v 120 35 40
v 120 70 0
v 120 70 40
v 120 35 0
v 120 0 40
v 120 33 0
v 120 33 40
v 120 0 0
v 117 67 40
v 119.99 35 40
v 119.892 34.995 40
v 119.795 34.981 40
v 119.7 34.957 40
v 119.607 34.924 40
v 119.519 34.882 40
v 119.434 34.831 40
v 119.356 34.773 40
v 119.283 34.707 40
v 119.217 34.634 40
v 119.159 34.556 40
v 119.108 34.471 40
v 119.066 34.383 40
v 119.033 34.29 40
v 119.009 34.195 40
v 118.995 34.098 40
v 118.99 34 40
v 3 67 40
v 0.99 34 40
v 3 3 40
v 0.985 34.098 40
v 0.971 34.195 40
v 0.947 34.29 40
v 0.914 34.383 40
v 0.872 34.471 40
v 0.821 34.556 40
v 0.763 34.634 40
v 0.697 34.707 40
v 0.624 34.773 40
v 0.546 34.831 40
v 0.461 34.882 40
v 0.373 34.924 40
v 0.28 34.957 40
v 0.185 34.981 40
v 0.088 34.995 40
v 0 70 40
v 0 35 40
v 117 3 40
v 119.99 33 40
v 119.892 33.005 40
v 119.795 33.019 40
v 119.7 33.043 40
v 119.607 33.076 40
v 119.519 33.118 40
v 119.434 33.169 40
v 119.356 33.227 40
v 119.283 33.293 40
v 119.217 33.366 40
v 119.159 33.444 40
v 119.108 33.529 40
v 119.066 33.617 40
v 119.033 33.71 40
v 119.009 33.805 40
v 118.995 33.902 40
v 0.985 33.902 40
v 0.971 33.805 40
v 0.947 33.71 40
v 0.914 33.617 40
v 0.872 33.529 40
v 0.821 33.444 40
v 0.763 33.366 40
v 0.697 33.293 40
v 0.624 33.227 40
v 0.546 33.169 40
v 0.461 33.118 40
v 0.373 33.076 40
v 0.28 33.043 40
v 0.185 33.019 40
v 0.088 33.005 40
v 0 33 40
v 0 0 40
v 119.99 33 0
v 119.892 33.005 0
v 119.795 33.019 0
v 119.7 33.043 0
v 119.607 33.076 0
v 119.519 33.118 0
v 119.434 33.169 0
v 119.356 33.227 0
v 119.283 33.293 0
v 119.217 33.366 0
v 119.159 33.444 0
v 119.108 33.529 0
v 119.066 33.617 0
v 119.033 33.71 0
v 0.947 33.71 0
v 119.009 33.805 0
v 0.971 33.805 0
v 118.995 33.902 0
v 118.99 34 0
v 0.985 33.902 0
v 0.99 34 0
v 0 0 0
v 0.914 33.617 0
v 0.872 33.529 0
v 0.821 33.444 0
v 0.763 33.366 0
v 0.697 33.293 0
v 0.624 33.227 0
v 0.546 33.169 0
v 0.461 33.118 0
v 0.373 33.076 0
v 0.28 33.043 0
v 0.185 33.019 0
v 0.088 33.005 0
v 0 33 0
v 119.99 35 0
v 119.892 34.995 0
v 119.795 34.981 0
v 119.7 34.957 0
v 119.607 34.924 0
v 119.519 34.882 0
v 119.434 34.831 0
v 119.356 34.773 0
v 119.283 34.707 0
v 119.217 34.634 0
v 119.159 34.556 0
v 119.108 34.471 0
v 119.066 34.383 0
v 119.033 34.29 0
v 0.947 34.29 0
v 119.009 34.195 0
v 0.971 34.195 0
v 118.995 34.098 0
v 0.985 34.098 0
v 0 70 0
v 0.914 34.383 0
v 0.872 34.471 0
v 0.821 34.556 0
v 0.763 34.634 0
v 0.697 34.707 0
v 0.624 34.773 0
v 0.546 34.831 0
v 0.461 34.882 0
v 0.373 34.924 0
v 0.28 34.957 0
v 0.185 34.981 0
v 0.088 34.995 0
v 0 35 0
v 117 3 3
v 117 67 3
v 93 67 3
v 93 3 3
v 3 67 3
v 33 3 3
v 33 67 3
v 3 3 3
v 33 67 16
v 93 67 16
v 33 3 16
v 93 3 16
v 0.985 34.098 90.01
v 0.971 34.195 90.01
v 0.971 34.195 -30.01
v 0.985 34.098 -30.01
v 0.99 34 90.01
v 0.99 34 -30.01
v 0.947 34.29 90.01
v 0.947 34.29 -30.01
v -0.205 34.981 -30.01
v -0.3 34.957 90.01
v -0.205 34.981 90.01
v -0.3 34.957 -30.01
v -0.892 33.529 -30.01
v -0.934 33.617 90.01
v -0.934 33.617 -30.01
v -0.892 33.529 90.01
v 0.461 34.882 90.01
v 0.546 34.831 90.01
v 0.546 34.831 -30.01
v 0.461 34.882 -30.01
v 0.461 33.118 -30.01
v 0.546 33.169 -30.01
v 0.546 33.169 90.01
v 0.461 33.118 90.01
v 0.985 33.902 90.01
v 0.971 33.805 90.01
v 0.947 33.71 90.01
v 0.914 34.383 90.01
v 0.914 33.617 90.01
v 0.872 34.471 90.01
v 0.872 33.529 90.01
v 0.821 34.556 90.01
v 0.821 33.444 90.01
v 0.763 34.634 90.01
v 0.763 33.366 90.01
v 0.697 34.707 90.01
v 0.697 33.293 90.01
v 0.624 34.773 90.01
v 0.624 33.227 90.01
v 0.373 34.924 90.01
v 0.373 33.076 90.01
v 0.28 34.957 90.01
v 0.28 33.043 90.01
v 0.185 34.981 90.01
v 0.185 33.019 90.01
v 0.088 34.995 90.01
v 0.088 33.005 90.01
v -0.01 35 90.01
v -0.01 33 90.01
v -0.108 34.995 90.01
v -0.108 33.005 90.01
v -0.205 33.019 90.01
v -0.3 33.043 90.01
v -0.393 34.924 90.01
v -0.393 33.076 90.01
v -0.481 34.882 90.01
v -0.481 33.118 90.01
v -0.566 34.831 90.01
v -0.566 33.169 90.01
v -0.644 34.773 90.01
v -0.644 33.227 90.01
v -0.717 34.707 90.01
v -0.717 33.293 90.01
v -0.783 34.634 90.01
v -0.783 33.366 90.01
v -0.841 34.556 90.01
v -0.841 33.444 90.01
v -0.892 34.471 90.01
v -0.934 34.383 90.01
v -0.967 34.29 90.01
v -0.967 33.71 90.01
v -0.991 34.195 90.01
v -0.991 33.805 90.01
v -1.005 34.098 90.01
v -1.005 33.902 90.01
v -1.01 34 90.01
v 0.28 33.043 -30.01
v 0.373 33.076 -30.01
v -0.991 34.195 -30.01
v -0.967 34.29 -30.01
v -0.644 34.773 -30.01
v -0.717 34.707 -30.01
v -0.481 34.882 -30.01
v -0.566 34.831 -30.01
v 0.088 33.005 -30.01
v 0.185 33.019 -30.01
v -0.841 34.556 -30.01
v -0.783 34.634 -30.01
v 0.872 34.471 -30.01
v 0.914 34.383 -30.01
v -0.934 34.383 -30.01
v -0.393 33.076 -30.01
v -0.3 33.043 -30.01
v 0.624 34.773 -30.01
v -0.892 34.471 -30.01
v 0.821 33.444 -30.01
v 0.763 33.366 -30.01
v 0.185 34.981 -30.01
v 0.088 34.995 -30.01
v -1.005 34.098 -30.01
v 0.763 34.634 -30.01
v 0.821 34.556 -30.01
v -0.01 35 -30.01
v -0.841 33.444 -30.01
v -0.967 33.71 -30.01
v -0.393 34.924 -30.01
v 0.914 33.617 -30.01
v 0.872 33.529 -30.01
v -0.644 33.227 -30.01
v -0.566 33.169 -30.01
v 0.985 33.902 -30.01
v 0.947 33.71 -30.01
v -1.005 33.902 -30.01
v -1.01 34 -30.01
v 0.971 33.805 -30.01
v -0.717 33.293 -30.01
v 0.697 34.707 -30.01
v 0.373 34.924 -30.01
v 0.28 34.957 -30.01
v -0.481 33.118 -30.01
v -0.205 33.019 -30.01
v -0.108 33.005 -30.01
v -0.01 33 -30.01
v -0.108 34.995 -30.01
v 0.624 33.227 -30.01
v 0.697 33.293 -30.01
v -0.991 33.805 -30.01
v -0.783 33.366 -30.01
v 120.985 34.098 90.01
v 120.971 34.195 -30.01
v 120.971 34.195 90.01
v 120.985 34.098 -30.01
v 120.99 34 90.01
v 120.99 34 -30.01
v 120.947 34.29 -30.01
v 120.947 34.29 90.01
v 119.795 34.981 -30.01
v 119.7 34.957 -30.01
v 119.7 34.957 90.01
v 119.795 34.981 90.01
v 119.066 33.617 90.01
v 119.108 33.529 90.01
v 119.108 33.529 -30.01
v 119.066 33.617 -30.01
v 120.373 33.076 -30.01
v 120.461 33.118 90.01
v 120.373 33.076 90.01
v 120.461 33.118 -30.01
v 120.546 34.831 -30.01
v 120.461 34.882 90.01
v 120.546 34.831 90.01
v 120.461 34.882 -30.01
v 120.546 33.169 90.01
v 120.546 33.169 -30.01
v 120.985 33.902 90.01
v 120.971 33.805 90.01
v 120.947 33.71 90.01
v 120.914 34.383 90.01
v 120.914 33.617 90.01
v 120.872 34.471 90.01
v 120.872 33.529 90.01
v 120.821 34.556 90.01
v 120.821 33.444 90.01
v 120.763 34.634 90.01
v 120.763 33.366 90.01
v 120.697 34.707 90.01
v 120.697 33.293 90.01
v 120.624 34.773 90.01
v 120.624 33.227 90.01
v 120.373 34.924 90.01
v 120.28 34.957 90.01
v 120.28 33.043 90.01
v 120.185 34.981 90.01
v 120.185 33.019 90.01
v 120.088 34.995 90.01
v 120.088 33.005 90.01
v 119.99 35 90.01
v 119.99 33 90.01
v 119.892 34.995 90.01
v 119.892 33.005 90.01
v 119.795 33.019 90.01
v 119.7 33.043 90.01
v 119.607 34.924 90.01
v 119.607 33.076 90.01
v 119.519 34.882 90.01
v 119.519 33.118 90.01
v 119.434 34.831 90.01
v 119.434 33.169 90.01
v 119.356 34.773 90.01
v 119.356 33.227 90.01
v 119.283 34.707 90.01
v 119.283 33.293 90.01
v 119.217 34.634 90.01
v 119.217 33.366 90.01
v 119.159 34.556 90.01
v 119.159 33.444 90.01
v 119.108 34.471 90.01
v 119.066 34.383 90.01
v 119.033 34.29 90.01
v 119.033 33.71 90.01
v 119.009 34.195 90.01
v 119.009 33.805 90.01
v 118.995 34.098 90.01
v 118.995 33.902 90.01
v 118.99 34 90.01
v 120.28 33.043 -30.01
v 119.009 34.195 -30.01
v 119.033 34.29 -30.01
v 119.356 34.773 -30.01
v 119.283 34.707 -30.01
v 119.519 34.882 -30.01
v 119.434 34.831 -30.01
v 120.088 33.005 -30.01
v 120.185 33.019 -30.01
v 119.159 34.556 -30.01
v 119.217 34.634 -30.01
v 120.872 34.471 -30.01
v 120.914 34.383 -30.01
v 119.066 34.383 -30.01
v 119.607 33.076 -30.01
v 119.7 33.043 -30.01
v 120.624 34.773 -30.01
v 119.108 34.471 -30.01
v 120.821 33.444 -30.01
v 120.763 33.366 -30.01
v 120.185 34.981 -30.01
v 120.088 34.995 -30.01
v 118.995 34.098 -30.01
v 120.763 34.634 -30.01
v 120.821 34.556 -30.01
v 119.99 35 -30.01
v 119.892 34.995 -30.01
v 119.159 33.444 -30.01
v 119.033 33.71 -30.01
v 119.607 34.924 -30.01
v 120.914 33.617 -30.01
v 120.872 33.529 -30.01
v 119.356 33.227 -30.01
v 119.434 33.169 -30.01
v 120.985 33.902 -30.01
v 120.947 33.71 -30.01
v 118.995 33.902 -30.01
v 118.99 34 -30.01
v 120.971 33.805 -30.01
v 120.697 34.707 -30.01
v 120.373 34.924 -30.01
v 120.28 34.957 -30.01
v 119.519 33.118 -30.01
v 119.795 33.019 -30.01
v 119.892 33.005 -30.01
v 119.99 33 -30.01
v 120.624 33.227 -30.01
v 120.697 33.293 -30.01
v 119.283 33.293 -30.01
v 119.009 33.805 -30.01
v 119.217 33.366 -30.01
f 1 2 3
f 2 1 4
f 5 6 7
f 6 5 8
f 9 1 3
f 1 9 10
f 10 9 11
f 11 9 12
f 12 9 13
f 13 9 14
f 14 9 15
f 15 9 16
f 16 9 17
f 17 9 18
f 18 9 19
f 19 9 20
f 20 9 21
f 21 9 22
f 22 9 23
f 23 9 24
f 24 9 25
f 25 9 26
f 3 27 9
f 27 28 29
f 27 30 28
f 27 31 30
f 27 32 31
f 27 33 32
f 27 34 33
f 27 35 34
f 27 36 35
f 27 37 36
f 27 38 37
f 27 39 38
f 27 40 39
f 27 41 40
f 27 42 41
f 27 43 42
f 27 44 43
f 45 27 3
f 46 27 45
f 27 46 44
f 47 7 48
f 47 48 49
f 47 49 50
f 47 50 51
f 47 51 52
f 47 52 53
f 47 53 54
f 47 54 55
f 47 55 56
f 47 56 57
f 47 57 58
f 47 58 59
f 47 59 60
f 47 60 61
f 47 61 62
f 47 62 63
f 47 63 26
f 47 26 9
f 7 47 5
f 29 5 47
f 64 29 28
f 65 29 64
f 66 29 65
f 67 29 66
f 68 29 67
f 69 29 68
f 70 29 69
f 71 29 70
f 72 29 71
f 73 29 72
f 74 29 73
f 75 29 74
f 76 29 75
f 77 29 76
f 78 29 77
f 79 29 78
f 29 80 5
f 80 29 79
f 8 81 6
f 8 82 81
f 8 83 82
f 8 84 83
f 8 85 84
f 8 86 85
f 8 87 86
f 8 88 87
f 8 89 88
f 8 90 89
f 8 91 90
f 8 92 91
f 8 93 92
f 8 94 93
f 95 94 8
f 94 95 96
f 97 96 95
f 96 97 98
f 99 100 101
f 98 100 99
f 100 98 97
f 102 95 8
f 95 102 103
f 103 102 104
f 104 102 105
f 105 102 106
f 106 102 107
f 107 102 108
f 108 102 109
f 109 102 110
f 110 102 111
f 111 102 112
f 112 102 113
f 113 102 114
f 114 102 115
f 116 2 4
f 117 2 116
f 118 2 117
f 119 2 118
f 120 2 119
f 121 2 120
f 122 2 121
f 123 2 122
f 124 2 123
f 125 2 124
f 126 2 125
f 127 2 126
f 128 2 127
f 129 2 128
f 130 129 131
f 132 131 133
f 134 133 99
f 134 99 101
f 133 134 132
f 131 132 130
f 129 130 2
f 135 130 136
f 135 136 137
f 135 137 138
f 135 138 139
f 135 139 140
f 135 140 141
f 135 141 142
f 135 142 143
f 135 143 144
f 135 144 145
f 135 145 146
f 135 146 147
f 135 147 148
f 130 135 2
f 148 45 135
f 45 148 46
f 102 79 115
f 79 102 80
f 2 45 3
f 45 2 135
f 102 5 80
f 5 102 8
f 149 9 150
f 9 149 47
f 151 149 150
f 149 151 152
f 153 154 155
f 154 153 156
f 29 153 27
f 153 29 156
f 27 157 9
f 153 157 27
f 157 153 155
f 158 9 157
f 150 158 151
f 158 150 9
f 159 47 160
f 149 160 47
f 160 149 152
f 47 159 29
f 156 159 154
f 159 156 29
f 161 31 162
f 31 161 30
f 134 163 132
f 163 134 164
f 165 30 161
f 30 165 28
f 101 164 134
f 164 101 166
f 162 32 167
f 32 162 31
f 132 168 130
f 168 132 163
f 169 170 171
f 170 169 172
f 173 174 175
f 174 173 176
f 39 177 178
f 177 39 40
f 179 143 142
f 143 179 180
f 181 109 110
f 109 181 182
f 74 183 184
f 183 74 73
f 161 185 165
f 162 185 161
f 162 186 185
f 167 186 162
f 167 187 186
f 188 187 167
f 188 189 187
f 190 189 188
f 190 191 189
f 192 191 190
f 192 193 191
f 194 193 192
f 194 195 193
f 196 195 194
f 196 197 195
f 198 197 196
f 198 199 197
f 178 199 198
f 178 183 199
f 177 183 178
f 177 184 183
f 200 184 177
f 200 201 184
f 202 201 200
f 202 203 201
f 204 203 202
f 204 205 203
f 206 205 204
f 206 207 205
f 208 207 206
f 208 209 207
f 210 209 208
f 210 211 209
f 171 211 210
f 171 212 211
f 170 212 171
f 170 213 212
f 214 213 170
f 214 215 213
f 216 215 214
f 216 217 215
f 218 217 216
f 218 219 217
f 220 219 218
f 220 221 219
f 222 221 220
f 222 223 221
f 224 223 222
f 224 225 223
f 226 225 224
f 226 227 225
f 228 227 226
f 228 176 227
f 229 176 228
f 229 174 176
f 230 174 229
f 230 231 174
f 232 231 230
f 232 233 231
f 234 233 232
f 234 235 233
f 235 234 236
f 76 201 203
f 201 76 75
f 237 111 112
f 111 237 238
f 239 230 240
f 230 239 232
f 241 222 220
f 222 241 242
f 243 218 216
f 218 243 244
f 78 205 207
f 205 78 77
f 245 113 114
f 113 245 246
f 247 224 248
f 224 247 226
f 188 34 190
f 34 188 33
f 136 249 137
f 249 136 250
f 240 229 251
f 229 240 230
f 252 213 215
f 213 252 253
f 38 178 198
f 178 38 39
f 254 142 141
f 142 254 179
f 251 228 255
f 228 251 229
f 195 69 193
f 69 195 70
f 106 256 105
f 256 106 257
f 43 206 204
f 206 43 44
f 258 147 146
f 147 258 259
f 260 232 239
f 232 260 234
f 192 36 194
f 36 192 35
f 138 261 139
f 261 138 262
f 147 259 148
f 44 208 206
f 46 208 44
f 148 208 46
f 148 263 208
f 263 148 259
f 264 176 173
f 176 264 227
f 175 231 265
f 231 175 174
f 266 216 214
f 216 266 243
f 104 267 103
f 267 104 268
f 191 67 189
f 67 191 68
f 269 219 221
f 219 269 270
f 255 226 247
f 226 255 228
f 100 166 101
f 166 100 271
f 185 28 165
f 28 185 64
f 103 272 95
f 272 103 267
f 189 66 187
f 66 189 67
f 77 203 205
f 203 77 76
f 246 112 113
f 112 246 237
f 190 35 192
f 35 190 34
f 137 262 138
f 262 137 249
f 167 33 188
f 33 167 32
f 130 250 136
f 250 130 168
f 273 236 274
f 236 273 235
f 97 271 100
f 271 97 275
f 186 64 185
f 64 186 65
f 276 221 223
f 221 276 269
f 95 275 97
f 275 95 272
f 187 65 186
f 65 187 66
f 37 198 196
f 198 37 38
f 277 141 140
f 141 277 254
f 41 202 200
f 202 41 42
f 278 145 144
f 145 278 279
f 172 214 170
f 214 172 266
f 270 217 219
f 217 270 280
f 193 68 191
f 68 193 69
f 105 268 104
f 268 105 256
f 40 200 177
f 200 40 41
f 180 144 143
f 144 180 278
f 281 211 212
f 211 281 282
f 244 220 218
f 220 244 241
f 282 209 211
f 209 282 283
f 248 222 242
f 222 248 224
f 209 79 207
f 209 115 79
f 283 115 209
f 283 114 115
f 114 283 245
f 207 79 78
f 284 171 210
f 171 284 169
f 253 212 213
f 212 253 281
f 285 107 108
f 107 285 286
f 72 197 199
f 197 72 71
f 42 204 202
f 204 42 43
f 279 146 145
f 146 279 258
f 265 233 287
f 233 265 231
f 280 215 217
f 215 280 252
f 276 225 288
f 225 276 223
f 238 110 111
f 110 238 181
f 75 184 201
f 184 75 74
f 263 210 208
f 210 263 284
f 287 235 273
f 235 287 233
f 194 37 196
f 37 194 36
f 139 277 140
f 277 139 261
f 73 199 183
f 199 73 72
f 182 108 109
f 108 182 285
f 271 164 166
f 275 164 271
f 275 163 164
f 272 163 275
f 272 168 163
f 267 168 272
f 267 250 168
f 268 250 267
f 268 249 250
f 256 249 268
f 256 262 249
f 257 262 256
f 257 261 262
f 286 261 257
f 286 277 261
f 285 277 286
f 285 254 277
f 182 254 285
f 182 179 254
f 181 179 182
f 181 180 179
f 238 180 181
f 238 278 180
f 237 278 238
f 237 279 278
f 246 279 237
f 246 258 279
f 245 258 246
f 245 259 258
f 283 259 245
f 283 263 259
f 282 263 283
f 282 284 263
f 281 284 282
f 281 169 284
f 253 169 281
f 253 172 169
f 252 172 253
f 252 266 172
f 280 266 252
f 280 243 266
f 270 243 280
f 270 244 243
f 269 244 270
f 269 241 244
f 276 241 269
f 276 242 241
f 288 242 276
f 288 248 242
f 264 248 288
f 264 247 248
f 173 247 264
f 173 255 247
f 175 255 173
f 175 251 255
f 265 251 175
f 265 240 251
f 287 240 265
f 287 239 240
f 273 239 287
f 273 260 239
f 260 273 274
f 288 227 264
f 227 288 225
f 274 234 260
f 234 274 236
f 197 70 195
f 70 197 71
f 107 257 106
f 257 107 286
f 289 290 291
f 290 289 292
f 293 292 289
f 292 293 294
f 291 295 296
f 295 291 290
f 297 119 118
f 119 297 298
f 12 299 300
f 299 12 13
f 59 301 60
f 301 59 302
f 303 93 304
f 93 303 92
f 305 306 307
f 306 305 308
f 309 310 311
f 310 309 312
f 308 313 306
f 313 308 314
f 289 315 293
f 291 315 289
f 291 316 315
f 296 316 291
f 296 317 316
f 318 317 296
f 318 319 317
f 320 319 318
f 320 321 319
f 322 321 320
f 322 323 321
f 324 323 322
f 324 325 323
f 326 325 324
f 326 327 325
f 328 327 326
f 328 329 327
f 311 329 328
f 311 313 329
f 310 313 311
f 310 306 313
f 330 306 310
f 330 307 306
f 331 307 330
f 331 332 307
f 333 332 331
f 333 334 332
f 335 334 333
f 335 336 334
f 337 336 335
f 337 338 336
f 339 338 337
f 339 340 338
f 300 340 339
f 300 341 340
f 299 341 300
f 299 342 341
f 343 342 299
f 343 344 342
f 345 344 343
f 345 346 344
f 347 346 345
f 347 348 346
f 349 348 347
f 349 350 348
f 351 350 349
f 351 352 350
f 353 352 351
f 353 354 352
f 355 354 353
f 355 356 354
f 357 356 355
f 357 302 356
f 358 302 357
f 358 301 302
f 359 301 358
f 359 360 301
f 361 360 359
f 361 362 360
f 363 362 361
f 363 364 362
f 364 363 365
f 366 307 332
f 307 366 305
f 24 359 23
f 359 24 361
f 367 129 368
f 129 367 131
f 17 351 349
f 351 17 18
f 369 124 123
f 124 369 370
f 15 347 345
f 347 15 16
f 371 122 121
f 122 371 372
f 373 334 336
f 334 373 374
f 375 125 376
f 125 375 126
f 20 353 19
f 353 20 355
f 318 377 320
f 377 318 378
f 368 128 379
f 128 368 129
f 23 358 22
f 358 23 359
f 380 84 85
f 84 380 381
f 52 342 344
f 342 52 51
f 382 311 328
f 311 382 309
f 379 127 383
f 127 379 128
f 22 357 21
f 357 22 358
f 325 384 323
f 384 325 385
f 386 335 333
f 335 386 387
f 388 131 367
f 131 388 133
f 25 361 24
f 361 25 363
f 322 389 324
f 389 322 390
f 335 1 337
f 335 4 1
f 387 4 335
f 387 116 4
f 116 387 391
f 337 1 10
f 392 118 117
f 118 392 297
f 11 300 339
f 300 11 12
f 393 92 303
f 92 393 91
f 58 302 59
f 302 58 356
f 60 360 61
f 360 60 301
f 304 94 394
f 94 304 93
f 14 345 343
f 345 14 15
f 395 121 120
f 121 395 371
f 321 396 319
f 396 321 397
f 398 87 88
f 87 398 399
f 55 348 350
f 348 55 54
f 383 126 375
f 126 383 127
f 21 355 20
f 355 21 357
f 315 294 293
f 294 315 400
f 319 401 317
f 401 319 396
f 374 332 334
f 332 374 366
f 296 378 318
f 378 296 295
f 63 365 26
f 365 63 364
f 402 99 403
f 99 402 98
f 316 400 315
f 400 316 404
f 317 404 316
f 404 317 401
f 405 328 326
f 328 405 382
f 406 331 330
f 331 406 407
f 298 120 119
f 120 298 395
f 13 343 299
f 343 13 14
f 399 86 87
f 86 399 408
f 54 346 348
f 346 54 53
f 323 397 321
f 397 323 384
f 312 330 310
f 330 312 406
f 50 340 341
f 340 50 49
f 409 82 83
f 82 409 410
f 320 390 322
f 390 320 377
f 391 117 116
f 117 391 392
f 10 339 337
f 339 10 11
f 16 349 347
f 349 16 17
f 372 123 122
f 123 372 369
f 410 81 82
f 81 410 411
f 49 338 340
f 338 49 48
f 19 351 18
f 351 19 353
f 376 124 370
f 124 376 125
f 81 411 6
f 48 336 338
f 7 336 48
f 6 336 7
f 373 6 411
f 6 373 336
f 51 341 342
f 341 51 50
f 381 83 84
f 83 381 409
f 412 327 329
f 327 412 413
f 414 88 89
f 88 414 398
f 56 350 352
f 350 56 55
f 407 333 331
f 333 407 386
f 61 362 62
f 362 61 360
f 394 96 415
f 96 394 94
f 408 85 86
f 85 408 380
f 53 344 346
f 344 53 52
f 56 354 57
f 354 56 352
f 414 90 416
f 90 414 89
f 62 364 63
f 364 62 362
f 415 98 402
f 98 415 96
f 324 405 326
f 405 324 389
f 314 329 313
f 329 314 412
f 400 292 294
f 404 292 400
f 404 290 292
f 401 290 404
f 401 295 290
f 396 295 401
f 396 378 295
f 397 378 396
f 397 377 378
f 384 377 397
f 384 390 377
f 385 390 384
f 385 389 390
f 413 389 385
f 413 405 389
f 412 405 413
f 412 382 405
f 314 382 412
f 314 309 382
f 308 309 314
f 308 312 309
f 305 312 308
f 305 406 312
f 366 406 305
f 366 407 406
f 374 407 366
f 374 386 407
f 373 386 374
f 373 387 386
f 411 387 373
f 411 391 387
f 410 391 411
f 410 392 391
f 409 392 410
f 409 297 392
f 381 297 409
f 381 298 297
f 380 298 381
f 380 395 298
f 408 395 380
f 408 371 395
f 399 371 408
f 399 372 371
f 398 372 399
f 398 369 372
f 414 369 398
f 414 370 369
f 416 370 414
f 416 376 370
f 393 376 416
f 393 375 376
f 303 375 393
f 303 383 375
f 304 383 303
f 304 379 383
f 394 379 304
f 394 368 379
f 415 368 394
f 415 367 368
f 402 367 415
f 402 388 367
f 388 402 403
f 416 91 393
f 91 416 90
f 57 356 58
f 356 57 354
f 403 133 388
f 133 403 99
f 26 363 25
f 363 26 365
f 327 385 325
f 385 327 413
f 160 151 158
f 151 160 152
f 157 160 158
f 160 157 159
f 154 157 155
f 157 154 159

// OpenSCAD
// Buffer tank for mini horizontal gel-electrophoresis box
// Outer dimensions: 120 mm (X) x 70 mm (Y) x 40 mm (Z)
// Wall thickness: 3 mm, floor thickness: 3 mm
// Platform: 60 mm long (X), full inner width (Y), top at z = 13 mm (10 mm above inner floor)

$fn = 64;

// Dimensions
outer_x = 120;
outer_y = 70;
outer_z = 40;
wall_thick = 3;
floor_thick = 3;
platform_length = 60;
platform_height = 13; // z = 13 mm from bottom
hole_dia = 2;
hole_z = 30;
hole_y = 0;

// Calculate inner dimensions
inner_x = outer_x - 2 * wall_thick;
inner_y = outer_y - 2 * wall_thick;
inner_z = outer_z - floor_thick;

// Buffer tank shell
module tank_shell() {
    difference() {
        // Outer shell
        cube([outer_x, outer_y, outer_z]);
        
        // Inner cavity (removes interior)
        translate([wall_thick, wall_thick, floor_thick])
            cube([inner_x, inner_y, inner_z]);
        
        // Remove platform area from the bottom (to create hollow under platform)
        // Platform is centered in X, so it starts at (outer_x - platform_length)/2
        platform_start_x = (outer_x - platform_length) / 2;
        translate([wall_thick + platform_start_x, wall_thick, floor_thick])
            cube([platform_length, inner_y, platform_height]);
    }
}

// Platform (solid raised platform)
module platform() {
    platform_start_x = (outer_x - platform_length) / 2;
    translate([wall_thick + platform_start_x, wall_thick, floor_thick])
        cube([platform_length, inner_y, platform_height]);
}

// Electrode holes (through end walls at X = 0 and X = outer_x)
module electrode_holes() {
    // Left hole (at x = 0 wall, centered in Y and at z = 30)
    // Position: x = -0.01 (to cut through left wall), y = (outer_y - hole_dia)/2, z = hole_z
    translate([-0.01, (outer_y - hole_dia)/2, hole_z])
        cylinder(h = 0.02 + outer_x, d = hole_dia, center = true);
    
    // Right hole (at x = outer_x wall)
    translate([outer_x - 0.01, (outer_y - hole_dia)/2, hole_z])
        cylinder(h = 0.02 + outer_x, d = hole_dia, center = true);
}

// Build the buffer tank
module buffer_tank() {
    union() {
        // Tank shell
        tank_shell();
        
        // Platform
        platform();
        
        // Electrode holes (cut through end walls)
        electrode_holes();
    }
}

// Render the buffer tank
buffer_tank();
